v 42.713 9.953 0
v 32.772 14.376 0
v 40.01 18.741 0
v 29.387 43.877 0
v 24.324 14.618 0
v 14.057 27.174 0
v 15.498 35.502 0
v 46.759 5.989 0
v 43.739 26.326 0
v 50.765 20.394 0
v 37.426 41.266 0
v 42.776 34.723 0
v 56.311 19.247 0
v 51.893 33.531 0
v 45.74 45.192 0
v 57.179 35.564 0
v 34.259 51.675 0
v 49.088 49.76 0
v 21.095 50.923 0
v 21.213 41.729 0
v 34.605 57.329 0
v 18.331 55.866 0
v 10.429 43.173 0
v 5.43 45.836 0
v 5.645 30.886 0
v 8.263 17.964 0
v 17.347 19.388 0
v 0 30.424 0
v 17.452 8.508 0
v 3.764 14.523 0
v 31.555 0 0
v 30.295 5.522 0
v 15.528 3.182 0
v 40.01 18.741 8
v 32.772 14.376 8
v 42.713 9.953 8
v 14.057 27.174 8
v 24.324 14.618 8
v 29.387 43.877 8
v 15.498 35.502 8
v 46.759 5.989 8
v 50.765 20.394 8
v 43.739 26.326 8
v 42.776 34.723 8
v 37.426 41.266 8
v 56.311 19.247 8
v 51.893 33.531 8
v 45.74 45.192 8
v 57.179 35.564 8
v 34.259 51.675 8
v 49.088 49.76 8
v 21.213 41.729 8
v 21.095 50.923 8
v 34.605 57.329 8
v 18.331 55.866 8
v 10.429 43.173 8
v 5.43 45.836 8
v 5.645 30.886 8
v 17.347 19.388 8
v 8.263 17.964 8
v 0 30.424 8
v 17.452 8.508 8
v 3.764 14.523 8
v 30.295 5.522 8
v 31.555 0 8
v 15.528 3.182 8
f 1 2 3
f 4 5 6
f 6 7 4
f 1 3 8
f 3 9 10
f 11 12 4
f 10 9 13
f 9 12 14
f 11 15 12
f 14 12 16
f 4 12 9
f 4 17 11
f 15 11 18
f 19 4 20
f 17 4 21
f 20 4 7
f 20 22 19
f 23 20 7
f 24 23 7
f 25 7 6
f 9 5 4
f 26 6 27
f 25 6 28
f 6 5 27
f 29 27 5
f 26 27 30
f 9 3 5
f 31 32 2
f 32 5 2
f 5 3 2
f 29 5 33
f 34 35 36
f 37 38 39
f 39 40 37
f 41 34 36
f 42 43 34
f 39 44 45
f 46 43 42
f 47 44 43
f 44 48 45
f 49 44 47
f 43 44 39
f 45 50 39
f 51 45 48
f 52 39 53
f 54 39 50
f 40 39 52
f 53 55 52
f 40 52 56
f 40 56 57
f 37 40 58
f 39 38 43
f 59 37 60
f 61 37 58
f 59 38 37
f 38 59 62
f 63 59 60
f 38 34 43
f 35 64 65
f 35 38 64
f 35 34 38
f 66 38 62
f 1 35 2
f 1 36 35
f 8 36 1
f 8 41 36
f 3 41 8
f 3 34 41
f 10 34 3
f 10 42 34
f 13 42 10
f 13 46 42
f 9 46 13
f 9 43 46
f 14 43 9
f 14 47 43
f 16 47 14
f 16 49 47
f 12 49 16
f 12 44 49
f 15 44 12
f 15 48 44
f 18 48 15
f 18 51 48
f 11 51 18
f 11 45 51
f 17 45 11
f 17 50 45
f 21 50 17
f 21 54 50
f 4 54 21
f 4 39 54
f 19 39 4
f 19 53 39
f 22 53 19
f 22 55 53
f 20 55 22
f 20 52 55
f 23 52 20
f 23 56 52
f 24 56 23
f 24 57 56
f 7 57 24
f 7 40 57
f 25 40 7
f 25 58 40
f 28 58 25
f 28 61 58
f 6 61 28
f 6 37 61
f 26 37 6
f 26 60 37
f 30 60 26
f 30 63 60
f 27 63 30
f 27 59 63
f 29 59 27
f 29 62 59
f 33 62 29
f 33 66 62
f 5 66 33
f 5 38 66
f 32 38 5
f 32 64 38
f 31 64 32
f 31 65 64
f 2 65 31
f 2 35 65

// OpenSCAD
$fn = 32;

// ----------------------------------------------------------------------
// Fan rotor section: 11 blades, 15 mm hub radius, 14 mm blades
// ----------------------------------------------------------------------

// --- parameters (mm) ---
profile_height = 8;       // extrusion height
profile_points = 33;      // points of the closed outline

profile = [[43.739, 26.326], [51.893, 33.531], [57.179, 35.564], [42.776, 34.723], [45.74, 45.192], [49.088, 49.76], [37.426, 41.266], [34.259, 51.675], [34.605, 57.329], [29.387, 43.877], [21.095, 50.923], [18.331, 55.866], [21.213, 41.729], [10.429, 43.173], [5.43, 45.836], [15.498, 35.502], [5.645, 30.886], [0, 30.424], [14.057, 27.174], [8.263, 17.964], [3.764, 14.523], [17.347, 19.388], [17.452, 8.508], [15.528, 3.182], [24.324, 14.618], [30.295, 5.522], [31.555, 0], [32.772, 14.376], [42.713, 9.953], [46.759, 5.989], [40.01, 18.741], [50.765, 20.394], [56.311, 19.247]];  // single closed polygon, 33 points, counter clockwise

// --- the one profile operation ---
linear_extrude(height = profile_height) polygon(points = profile);
